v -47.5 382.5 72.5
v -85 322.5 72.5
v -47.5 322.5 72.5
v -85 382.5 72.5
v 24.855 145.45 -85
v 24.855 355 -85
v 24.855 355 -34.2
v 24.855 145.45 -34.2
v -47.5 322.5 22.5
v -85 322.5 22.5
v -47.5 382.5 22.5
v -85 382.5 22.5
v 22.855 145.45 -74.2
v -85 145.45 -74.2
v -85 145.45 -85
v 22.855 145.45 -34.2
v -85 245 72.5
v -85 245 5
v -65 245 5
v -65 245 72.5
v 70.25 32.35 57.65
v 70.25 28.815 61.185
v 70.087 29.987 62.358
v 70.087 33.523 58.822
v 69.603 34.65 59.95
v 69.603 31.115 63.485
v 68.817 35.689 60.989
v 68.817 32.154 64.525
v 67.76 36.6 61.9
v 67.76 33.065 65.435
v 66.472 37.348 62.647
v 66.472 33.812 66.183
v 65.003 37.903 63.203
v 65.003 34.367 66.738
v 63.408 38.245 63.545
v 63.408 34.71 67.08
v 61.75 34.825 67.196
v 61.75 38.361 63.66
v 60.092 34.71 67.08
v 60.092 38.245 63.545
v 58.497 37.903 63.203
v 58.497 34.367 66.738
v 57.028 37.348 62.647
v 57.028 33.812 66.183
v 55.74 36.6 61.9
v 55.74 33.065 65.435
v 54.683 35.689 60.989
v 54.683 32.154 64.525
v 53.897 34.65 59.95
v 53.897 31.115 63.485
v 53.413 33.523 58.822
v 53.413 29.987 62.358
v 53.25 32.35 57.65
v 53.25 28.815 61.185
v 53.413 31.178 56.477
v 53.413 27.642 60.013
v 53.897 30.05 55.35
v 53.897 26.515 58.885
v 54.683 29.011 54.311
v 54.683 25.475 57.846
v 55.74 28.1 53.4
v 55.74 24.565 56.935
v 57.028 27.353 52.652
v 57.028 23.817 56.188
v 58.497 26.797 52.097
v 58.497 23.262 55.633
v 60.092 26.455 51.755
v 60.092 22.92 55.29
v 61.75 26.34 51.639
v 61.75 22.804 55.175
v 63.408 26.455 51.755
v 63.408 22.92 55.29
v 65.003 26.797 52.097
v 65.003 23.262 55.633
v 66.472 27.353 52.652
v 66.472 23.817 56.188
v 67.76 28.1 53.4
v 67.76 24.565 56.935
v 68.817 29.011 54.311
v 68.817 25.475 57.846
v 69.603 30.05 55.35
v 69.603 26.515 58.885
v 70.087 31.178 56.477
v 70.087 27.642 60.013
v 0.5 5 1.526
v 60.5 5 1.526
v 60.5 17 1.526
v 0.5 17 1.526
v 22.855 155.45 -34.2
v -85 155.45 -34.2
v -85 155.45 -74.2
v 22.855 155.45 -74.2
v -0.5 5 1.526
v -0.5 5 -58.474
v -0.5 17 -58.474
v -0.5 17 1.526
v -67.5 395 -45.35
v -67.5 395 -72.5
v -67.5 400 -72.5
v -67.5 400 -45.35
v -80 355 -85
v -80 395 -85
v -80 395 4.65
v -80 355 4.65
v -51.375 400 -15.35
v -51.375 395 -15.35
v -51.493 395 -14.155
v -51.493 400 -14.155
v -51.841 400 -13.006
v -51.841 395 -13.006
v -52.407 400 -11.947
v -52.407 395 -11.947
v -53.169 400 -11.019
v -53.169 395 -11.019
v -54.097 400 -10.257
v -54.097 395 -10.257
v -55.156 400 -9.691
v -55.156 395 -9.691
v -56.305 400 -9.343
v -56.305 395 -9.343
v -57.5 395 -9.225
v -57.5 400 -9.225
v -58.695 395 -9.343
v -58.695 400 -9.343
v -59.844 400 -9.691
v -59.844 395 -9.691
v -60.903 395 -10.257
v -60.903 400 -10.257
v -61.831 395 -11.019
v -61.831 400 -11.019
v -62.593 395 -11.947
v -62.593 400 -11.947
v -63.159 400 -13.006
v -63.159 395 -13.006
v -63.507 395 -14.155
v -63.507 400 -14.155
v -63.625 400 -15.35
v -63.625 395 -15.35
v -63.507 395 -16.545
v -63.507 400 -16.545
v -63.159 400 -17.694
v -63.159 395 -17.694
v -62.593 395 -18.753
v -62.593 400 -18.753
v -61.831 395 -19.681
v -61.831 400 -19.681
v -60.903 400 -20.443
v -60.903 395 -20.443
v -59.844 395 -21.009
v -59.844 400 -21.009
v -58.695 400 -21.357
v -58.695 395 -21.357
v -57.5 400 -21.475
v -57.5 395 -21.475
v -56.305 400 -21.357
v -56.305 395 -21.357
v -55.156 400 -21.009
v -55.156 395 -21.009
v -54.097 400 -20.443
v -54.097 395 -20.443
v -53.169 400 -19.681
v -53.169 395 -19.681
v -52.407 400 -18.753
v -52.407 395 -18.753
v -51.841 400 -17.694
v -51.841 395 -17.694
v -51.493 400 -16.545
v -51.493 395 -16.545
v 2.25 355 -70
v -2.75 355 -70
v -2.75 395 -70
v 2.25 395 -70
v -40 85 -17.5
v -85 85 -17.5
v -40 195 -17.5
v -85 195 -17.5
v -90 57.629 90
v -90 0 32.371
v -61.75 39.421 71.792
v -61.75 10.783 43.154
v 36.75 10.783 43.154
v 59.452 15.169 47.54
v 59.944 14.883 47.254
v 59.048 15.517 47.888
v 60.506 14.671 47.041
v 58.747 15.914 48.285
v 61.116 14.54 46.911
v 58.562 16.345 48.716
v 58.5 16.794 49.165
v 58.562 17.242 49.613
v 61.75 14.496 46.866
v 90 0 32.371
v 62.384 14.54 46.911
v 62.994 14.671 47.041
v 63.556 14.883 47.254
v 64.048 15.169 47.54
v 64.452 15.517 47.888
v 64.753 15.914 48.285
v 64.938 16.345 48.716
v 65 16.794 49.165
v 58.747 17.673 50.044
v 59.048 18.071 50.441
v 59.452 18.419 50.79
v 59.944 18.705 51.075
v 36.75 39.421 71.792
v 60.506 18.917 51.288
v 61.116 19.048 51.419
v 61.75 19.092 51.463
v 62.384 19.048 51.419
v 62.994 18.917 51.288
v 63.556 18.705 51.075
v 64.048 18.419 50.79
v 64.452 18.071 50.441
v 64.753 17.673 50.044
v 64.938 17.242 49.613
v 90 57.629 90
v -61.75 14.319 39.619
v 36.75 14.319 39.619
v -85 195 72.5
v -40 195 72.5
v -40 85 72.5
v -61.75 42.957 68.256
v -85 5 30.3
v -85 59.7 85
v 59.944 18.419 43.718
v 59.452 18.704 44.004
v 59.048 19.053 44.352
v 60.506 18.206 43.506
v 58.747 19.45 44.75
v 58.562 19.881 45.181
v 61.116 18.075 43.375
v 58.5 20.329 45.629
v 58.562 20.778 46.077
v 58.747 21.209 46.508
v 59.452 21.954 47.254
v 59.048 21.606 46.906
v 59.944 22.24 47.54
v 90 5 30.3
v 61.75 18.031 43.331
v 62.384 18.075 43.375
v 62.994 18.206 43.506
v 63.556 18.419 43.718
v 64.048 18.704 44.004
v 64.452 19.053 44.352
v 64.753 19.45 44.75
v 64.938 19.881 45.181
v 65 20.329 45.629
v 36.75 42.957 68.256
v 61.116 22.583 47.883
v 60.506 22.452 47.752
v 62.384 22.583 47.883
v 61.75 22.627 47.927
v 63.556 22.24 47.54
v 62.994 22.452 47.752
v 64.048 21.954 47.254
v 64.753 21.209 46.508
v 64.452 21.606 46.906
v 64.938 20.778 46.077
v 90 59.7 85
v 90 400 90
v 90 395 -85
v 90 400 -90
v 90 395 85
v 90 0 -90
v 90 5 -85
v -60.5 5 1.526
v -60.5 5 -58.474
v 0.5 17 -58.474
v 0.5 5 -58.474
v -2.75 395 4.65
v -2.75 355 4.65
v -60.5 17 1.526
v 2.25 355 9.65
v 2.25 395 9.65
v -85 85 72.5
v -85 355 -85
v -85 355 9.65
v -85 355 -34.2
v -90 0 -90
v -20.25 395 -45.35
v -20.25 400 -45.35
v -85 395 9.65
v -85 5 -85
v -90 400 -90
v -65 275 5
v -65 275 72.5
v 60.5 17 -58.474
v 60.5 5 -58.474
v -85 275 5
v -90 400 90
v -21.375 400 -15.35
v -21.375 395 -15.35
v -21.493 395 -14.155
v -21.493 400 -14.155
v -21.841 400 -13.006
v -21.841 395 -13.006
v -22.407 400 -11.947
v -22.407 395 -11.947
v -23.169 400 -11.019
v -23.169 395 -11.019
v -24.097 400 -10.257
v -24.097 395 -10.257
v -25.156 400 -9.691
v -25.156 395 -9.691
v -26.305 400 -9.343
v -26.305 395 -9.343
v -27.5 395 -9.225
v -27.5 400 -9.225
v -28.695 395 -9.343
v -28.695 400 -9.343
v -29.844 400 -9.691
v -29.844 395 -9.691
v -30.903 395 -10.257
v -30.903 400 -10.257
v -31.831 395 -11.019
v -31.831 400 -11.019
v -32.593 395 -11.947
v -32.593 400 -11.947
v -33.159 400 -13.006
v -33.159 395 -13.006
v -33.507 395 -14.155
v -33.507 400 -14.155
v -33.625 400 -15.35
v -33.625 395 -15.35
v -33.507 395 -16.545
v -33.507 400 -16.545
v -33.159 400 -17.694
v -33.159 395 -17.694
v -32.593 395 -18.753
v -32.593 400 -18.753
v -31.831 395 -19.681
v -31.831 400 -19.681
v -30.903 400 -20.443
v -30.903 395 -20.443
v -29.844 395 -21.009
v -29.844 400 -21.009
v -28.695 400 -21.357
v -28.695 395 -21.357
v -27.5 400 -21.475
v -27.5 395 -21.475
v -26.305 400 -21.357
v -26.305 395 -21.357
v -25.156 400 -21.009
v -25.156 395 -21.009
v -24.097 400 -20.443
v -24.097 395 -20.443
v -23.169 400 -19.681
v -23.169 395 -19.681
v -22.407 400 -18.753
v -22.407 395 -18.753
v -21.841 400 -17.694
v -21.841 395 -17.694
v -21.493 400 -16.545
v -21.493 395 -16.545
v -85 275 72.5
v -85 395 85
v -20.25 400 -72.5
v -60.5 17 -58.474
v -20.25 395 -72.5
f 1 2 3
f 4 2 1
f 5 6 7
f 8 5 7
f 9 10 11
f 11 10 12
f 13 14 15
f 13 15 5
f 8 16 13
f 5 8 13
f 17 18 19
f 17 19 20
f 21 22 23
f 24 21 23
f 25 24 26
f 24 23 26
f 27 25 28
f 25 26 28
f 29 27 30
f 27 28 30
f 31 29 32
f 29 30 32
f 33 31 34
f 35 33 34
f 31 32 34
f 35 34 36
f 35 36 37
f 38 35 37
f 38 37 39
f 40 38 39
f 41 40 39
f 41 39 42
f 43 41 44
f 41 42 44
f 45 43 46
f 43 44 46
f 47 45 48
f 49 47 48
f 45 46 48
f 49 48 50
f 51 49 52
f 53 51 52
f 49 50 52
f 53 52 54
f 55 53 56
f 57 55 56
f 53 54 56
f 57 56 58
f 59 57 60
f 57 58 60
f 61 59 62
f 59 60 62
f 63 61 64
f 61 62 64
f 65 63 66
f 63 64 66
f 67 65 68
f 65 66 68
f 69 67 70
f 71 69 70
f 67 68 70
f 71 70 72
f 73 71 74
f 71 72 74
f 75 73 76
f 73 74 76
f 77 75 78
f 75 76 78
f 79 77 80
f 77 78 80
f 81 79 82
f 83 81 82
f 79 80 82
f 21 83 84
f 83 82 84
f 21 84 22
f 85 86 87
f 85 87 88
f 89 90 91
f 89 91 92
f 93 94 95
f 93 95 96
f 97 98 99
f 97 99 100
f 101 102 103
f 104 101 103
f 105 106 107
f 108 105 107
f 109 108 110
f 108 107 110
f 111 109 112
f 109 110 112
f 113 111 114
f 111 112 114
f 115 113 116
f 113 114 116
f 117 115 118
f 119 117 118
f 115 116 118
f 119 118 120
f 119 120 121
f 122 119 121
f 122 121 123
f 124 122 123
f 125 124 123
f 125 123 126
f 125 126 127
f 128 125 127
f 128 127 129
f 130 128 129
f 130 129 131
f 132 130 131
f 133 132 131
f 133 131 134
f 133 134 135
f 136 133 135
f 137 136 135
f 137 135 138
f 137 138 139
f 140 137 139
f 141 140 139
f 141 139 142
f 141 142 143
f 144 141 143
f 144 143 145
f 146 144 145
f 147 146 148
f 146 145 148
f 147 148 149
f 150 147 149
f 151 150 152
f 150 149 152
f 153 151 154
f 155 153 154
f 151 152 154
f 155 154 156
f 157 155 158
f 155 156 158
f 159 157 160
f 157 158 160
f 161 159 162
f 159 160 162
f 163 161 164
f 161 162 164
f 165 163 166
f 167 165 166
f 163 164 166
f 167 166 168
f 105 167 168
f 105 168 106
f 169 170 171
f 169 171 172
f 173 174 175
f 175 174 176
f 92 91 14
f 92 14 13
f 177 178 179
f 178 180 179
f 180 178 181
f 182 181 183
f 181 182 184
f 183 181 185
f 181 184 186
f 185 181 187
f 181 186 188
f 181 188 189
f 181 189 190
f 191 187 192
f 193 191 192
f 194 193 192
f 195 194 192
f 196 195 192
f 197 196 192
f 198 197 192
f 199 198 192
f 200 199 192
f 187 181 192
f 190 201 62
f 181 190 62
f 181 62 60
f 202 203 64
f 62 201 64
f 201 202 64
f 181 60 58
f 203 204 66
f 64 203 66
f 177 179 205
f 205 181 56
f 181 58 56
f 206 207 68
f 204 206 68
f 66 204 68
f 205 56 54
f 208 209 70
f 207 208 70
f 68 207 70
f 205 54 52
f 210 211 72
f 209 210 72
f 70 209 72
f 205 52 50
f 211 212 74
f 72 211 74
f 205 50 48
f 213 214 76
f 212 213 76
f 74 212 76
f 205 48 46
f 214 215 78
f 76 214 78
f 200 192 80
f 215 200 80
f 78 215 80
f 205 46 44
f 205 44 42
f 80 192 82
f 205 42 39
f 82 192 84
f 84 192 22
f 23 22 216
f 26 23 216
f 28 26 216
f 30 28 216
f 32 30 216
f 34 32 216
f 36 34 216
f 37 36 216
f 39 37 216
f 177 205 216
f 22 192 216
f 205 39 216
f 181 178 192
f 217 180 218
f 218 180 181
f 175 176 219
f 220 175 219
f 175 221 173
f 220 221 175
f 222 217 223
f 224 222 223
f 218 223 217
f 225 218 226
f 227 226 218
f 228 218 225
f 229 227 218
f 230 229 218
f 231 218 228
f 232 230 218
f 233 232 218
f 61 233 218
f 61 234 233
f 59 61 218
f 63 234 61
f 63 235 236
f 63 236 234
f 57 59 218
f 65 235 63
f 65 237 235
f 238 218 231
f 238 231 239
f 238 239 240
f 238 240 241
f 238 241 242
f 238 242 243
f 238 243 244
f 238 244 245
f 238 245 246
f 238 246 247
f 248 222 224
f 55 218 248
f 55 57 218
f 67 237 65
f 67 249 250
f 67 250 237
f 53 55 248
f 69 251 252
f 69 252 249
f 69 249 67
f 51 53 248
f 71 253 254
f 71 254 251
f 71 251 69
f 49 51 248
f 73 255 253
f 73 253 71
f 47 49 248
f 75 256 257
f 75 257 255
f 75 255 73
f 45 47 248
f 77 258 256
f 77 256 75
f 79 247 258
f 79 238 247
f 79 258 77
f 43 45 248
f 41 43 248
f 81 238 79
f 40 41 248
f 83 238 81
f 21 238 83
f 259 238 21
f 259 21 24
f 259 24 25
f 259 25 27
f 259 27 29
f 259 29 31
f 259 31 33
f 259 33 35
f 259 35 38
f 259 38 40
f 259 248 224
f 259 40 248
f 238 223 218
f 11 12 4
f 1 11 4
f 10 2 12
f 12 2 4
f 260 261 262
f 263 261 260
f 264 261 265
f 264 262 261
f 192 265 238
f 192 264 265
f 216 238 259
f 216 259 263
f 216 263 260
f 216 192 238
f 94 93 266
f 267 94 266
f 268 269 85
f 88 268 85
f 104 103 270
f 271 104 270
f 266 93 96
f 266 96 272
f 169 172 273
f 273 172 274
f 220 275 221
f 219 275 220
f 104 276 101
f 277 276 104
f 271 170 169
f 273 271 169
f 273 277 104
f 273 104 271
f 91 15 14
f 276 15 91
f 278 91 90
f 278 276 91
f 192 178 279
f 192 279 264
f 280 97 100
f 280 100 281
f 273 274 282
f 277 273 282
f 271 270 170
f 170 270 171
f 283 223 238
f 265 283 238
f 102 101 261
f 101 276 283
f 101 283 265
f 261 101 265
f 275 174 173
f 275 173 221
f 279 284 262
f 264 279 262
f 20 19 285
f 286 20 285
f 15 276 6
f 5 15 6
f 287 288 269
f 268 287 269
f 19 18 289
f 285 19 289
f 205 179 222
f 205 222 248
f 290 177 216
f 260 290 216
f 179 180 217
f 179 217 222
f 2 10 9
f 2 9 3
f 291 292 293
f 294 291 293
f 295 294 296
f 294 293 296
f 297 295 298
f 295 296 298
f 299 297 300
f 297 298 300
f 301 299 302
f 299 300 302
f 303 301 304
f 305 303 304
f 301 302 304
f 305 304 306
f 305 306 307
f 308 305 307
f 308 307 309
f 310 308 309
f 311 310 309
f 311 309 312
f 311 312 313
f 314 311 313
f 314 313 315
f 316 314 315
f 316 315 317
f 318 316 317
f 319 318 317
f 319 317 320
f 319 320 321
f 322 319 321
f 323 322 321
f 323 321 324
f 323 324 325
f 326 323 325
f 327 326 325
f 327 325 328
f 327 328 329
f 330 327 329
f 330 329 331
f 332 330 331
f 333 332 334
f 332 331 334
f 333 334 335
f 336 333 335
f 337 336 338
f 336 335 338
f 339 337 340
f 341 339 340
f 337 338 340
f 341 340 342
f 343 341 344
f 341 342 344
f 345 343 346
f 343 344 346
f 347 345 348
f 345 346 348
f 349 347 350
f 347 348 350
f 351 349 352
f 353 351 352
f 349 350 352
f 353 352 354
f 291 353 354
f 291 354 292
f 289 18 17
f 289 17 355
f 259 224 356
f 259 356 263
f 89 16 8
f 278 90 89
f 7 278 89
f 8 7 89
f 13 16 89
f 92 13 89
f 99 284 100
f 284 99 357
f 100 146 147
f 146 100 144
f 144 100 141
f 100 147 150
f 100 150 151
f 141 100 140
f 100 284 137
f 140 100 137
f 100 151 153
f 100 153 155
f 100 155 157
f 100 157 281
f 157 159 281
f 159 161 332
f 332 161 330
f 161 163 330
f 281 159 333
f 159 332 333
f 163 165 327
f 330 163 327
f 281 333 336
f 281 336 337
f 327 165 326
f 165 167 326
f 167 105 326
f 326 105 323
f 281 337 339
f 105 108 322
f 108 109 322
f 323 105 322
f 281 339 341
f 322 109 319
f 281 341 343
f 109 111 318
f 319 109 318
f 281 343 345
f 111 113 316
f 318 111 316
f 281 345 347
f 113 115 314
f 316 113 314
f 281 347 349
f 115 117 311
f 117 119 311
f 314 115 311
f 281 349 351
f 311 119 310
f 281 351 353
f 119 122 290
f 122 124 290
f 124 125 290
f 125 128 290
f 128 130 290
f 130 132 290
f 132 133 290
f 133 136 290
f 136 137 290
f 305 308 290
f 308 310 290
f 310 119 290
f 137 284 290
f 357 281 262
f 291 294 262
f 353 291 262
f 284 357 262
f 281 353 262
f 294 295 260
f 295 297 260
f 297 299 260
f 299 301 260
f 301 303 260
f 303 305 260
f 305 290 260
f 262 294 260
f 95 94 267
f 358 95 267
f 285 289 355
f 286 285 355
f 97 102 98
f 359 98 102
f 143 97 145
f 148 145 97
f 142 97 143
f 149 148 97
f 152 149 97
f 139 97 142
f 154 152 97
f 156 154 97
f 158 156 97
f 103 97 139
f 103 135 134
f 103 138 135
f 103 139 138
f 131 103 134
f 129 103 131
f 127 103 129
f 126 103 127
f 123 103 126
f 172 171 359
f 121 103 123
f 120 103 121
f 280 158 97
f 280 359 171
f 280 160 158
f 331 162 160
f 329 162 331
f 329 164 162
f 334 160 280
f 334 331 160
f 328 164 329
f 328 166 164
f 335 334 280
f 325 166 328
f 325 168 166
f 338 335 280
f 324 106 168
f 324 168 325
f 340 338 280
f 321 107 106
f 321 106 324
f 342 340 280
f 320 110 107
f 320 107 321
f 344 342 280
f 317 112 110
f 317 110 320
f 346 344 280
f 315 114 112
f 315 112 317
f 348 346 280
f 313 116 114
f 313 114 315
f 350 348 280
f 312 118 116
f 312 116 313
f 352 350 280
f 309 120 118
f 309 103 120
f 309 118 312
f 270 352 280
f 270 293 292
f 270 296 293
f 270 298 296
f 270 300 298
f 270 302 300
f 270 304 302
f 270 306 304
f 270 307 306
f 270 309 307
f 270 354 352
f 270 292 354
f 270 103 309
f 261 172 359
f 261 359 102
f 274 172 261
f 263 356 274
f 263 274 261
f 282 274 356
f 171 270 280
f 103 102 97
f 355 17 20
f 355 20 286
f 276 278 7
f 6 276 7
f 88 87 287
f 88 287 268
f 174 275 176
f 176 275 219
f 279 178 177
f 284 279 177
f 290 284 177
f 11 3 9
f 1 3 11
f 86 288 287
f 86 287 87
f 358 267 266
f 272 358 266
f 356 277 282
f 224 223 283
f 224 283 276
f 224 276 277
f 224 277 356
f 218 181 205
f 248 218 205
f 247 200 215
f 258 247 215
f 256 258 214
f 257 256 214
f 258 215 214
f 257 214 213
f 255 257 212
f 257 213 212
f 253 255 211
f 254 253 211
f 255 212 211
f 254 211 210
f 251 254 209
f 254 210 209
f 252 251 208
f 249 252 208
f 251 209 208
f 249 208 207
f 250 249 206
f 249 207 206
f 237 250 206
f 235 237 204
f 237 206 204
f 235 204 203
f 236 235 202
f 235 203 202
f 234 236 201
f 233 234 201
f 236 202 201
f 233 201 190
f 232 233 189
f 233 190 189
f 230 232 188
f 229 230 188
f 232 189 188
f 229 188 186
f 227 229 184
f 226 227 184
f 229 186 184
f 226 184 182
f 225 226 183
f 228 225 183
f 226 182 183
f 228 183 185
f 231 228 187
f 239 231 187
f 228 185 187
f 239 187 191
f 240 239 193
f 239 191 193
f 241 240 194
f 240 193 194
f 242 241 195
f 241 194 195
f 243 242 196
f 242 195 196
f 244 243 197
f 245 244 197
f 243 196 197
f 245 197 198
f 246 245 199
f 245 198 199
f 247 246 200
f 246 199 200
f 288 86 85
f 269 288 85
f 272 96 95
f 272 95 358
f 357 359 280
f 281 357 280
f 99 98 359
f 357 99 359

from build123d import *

# Parameters (mm, degrees)
F0_W          = 180
F0_H          = 180
F1_DEPTH      = 400
F3_DEPTH      = 90.001
F3_DEPTH_BACK = 90.001
F4_T          = -5
F5_W          = 98.5
F5_H          = 40.5
F5_R          = 8.5
F5_R_2        = 3.25
F6_DEPTH      = 5
F7_W          = 60
F7_H          = 60
F8_DEPTH      = 12
F9_W          = 47.25
F9_H          = 27.15
F9_R          = 6.125
F10_DEPTH     = 5.001
F12_DEPTH     = 40
F13_W         = 109.855
F13_H         = 50.8
F14_DEPTH     = 209.55
F15_W         = 107.855
F15_H         = 10
F16_DEPTH     = 40
F17_W         = 60
F17_H         = 50
F18_DEPTH     = 37.5
F19_W         = 30
F19_H         = 67.5
F20_DEPTH     = 20
F21_W         = 110
F21_H         = 90
F22_DEPTH     = 45


with BuildPart() as f1:
    # F0 (on Front) → F1 (new body)
    with BuildSketch(Plane.XZ):
        Rectangle(F0_W, F0_H)
    extrude(amount=-F1_DEPTH)

    # F2 (on Right) → F3 (cut, two sides)
    with BuildSketch(Plane.YZ) as f3_sk:
        Polygon((57.6292026667, 90), (0, 90), (0, 32.3707973333), align=None)
    extrude(amount=-F3_DEPTH, mode=Mode.SUBTRACT)
    extrude(f3_sk.sketch, amount=F3_DEPTH_BACK, mode=Mode.SUBTRACT)

    # F4
    f4_openings = [f1.faces().sort_by_distance(p)[0] for p in [
        (90, 204.268068, -1.671206),
    ]]
    offset(amount=F4_T, openings=f4_openings)

    # F5 (on face) → F6 (cut, through all)
    with BuildSketch(Plane(origin=(0, -16.1853986666, 16.1853986666), x_dir=(1, 0, 0), z_dir=(0, -0.7071067812, 0.7071067812))):
        with Locations((-12.5, 58.3896103068)):
            Rectangle(F5_W, F5_H)
        with Locations((61.75, 63.6396103068)):
            Circle(F5_R)
        with Locations((61.75, 46.6396103068)):
            Circle(F5_R_2)
    extrude(amount=-F6_DEPTH, mode=Mode.SUBTRACT)

    # F9 (on face) → F10 (cut, through all)
    with BuildSketch(Plane.XZ.offset(-395)):
        with Locations((-43.875, -58.925)):
            Rectangle(F9_W, F9_H)
        with Locations((-57.5, -15.35)):
            Circle(F9_R)
        with Locations((-27.5, -15.35)):
            Circle(F9_R)
    extrude(amount=-F10_DEPTH, mode=Mode.SUBTRACT)

    # F11 (on face) → F12 (join)
    with BuildSketch(Plane.XZ.offset(-395)):
        Polygon((-80, -85), (-80, 4.65), (-2.75, 4.65), (-2.75, -70), (2.25, -70), (2.25, 9.65), (-85, 9.65), (-85, -85), align=None)
    extrude(amount=F12_DEPTH)


with BuildPart() as f8:
    # F7 (on face) → F8 (new body)
    with BuildSketch(Plane(origin=(0, 5, 0), x_dir=(-1, 0, 0), z_dir=(0, 1, 0))):
        with Locations((-30.5, -28.4744981494)):
            Rectangle(F7_W, F7_H)
    extrude(amount=F8_DEPTH)


with BuildPart() as f8b:
    # F7 (on face) → F8, piece 2 (new body)
    with BuildSketch(Plane(origin=(0, 5, 0), x_dir=(-1, 0, 0), z_dir=(0, 1, 0))):
        with Locations((30.5, -28.4744981494)):
            Rectangle(F7_W, F7_H)
    extrude(amount=F8_DEPTH)


with BuildPart() as f14:
    # F13 (on face) → F14 (new body)
    with BuildSketch(Plane.XZ.offset(-355)):
        with Locations((-30.0725, -59.6)):
            Rectangle(F13_W, F13_H)
    extrude(amount=F14_DEPTH)

    # F15 (on face) → F16 (cut)
    with BuildSketch(Plane.XY.offset(-34.2)):
        with Locations((-31.0725, 150.45)):
            Rectangle(F15_W, F15_H)
    extrude(amount=-F16_DEPTH, mode=Mode.SUBTRACT)


with BuildPart() as f18:
    # F17 (on face) → F18 (new body)
    with BuildSketch(Plane.YZ.offset(-85)):
        with Locations((352.5, 47.5)):
            Rectangle(F17_W, F17_H)
    extrude(amount=F18_DEPTH)


with BuildPart() as f20:
    # F19 (on face) → F20 (new body)
    with BuildSketch(Plane.YZ.offset(-85)):
        with Locations((260, 38.75)):
            Rectangle(F19_W, F19_H)
    extrude(amount=F20_DEPTH)


with BuildPart() as f22:
    # F21 (on face) → F22 (new body)
    with BuildSketch(Plane.YZ.offset(-85)):
        with Locations((140, 27.5)):
            Rectangle(F21_W, F21_H)
    extrude(amount=F22_DEPTH)


solid = Compound([f1.part, f8.part, f8b.part, f14.part, f18.part, f20.part, f22.part])
